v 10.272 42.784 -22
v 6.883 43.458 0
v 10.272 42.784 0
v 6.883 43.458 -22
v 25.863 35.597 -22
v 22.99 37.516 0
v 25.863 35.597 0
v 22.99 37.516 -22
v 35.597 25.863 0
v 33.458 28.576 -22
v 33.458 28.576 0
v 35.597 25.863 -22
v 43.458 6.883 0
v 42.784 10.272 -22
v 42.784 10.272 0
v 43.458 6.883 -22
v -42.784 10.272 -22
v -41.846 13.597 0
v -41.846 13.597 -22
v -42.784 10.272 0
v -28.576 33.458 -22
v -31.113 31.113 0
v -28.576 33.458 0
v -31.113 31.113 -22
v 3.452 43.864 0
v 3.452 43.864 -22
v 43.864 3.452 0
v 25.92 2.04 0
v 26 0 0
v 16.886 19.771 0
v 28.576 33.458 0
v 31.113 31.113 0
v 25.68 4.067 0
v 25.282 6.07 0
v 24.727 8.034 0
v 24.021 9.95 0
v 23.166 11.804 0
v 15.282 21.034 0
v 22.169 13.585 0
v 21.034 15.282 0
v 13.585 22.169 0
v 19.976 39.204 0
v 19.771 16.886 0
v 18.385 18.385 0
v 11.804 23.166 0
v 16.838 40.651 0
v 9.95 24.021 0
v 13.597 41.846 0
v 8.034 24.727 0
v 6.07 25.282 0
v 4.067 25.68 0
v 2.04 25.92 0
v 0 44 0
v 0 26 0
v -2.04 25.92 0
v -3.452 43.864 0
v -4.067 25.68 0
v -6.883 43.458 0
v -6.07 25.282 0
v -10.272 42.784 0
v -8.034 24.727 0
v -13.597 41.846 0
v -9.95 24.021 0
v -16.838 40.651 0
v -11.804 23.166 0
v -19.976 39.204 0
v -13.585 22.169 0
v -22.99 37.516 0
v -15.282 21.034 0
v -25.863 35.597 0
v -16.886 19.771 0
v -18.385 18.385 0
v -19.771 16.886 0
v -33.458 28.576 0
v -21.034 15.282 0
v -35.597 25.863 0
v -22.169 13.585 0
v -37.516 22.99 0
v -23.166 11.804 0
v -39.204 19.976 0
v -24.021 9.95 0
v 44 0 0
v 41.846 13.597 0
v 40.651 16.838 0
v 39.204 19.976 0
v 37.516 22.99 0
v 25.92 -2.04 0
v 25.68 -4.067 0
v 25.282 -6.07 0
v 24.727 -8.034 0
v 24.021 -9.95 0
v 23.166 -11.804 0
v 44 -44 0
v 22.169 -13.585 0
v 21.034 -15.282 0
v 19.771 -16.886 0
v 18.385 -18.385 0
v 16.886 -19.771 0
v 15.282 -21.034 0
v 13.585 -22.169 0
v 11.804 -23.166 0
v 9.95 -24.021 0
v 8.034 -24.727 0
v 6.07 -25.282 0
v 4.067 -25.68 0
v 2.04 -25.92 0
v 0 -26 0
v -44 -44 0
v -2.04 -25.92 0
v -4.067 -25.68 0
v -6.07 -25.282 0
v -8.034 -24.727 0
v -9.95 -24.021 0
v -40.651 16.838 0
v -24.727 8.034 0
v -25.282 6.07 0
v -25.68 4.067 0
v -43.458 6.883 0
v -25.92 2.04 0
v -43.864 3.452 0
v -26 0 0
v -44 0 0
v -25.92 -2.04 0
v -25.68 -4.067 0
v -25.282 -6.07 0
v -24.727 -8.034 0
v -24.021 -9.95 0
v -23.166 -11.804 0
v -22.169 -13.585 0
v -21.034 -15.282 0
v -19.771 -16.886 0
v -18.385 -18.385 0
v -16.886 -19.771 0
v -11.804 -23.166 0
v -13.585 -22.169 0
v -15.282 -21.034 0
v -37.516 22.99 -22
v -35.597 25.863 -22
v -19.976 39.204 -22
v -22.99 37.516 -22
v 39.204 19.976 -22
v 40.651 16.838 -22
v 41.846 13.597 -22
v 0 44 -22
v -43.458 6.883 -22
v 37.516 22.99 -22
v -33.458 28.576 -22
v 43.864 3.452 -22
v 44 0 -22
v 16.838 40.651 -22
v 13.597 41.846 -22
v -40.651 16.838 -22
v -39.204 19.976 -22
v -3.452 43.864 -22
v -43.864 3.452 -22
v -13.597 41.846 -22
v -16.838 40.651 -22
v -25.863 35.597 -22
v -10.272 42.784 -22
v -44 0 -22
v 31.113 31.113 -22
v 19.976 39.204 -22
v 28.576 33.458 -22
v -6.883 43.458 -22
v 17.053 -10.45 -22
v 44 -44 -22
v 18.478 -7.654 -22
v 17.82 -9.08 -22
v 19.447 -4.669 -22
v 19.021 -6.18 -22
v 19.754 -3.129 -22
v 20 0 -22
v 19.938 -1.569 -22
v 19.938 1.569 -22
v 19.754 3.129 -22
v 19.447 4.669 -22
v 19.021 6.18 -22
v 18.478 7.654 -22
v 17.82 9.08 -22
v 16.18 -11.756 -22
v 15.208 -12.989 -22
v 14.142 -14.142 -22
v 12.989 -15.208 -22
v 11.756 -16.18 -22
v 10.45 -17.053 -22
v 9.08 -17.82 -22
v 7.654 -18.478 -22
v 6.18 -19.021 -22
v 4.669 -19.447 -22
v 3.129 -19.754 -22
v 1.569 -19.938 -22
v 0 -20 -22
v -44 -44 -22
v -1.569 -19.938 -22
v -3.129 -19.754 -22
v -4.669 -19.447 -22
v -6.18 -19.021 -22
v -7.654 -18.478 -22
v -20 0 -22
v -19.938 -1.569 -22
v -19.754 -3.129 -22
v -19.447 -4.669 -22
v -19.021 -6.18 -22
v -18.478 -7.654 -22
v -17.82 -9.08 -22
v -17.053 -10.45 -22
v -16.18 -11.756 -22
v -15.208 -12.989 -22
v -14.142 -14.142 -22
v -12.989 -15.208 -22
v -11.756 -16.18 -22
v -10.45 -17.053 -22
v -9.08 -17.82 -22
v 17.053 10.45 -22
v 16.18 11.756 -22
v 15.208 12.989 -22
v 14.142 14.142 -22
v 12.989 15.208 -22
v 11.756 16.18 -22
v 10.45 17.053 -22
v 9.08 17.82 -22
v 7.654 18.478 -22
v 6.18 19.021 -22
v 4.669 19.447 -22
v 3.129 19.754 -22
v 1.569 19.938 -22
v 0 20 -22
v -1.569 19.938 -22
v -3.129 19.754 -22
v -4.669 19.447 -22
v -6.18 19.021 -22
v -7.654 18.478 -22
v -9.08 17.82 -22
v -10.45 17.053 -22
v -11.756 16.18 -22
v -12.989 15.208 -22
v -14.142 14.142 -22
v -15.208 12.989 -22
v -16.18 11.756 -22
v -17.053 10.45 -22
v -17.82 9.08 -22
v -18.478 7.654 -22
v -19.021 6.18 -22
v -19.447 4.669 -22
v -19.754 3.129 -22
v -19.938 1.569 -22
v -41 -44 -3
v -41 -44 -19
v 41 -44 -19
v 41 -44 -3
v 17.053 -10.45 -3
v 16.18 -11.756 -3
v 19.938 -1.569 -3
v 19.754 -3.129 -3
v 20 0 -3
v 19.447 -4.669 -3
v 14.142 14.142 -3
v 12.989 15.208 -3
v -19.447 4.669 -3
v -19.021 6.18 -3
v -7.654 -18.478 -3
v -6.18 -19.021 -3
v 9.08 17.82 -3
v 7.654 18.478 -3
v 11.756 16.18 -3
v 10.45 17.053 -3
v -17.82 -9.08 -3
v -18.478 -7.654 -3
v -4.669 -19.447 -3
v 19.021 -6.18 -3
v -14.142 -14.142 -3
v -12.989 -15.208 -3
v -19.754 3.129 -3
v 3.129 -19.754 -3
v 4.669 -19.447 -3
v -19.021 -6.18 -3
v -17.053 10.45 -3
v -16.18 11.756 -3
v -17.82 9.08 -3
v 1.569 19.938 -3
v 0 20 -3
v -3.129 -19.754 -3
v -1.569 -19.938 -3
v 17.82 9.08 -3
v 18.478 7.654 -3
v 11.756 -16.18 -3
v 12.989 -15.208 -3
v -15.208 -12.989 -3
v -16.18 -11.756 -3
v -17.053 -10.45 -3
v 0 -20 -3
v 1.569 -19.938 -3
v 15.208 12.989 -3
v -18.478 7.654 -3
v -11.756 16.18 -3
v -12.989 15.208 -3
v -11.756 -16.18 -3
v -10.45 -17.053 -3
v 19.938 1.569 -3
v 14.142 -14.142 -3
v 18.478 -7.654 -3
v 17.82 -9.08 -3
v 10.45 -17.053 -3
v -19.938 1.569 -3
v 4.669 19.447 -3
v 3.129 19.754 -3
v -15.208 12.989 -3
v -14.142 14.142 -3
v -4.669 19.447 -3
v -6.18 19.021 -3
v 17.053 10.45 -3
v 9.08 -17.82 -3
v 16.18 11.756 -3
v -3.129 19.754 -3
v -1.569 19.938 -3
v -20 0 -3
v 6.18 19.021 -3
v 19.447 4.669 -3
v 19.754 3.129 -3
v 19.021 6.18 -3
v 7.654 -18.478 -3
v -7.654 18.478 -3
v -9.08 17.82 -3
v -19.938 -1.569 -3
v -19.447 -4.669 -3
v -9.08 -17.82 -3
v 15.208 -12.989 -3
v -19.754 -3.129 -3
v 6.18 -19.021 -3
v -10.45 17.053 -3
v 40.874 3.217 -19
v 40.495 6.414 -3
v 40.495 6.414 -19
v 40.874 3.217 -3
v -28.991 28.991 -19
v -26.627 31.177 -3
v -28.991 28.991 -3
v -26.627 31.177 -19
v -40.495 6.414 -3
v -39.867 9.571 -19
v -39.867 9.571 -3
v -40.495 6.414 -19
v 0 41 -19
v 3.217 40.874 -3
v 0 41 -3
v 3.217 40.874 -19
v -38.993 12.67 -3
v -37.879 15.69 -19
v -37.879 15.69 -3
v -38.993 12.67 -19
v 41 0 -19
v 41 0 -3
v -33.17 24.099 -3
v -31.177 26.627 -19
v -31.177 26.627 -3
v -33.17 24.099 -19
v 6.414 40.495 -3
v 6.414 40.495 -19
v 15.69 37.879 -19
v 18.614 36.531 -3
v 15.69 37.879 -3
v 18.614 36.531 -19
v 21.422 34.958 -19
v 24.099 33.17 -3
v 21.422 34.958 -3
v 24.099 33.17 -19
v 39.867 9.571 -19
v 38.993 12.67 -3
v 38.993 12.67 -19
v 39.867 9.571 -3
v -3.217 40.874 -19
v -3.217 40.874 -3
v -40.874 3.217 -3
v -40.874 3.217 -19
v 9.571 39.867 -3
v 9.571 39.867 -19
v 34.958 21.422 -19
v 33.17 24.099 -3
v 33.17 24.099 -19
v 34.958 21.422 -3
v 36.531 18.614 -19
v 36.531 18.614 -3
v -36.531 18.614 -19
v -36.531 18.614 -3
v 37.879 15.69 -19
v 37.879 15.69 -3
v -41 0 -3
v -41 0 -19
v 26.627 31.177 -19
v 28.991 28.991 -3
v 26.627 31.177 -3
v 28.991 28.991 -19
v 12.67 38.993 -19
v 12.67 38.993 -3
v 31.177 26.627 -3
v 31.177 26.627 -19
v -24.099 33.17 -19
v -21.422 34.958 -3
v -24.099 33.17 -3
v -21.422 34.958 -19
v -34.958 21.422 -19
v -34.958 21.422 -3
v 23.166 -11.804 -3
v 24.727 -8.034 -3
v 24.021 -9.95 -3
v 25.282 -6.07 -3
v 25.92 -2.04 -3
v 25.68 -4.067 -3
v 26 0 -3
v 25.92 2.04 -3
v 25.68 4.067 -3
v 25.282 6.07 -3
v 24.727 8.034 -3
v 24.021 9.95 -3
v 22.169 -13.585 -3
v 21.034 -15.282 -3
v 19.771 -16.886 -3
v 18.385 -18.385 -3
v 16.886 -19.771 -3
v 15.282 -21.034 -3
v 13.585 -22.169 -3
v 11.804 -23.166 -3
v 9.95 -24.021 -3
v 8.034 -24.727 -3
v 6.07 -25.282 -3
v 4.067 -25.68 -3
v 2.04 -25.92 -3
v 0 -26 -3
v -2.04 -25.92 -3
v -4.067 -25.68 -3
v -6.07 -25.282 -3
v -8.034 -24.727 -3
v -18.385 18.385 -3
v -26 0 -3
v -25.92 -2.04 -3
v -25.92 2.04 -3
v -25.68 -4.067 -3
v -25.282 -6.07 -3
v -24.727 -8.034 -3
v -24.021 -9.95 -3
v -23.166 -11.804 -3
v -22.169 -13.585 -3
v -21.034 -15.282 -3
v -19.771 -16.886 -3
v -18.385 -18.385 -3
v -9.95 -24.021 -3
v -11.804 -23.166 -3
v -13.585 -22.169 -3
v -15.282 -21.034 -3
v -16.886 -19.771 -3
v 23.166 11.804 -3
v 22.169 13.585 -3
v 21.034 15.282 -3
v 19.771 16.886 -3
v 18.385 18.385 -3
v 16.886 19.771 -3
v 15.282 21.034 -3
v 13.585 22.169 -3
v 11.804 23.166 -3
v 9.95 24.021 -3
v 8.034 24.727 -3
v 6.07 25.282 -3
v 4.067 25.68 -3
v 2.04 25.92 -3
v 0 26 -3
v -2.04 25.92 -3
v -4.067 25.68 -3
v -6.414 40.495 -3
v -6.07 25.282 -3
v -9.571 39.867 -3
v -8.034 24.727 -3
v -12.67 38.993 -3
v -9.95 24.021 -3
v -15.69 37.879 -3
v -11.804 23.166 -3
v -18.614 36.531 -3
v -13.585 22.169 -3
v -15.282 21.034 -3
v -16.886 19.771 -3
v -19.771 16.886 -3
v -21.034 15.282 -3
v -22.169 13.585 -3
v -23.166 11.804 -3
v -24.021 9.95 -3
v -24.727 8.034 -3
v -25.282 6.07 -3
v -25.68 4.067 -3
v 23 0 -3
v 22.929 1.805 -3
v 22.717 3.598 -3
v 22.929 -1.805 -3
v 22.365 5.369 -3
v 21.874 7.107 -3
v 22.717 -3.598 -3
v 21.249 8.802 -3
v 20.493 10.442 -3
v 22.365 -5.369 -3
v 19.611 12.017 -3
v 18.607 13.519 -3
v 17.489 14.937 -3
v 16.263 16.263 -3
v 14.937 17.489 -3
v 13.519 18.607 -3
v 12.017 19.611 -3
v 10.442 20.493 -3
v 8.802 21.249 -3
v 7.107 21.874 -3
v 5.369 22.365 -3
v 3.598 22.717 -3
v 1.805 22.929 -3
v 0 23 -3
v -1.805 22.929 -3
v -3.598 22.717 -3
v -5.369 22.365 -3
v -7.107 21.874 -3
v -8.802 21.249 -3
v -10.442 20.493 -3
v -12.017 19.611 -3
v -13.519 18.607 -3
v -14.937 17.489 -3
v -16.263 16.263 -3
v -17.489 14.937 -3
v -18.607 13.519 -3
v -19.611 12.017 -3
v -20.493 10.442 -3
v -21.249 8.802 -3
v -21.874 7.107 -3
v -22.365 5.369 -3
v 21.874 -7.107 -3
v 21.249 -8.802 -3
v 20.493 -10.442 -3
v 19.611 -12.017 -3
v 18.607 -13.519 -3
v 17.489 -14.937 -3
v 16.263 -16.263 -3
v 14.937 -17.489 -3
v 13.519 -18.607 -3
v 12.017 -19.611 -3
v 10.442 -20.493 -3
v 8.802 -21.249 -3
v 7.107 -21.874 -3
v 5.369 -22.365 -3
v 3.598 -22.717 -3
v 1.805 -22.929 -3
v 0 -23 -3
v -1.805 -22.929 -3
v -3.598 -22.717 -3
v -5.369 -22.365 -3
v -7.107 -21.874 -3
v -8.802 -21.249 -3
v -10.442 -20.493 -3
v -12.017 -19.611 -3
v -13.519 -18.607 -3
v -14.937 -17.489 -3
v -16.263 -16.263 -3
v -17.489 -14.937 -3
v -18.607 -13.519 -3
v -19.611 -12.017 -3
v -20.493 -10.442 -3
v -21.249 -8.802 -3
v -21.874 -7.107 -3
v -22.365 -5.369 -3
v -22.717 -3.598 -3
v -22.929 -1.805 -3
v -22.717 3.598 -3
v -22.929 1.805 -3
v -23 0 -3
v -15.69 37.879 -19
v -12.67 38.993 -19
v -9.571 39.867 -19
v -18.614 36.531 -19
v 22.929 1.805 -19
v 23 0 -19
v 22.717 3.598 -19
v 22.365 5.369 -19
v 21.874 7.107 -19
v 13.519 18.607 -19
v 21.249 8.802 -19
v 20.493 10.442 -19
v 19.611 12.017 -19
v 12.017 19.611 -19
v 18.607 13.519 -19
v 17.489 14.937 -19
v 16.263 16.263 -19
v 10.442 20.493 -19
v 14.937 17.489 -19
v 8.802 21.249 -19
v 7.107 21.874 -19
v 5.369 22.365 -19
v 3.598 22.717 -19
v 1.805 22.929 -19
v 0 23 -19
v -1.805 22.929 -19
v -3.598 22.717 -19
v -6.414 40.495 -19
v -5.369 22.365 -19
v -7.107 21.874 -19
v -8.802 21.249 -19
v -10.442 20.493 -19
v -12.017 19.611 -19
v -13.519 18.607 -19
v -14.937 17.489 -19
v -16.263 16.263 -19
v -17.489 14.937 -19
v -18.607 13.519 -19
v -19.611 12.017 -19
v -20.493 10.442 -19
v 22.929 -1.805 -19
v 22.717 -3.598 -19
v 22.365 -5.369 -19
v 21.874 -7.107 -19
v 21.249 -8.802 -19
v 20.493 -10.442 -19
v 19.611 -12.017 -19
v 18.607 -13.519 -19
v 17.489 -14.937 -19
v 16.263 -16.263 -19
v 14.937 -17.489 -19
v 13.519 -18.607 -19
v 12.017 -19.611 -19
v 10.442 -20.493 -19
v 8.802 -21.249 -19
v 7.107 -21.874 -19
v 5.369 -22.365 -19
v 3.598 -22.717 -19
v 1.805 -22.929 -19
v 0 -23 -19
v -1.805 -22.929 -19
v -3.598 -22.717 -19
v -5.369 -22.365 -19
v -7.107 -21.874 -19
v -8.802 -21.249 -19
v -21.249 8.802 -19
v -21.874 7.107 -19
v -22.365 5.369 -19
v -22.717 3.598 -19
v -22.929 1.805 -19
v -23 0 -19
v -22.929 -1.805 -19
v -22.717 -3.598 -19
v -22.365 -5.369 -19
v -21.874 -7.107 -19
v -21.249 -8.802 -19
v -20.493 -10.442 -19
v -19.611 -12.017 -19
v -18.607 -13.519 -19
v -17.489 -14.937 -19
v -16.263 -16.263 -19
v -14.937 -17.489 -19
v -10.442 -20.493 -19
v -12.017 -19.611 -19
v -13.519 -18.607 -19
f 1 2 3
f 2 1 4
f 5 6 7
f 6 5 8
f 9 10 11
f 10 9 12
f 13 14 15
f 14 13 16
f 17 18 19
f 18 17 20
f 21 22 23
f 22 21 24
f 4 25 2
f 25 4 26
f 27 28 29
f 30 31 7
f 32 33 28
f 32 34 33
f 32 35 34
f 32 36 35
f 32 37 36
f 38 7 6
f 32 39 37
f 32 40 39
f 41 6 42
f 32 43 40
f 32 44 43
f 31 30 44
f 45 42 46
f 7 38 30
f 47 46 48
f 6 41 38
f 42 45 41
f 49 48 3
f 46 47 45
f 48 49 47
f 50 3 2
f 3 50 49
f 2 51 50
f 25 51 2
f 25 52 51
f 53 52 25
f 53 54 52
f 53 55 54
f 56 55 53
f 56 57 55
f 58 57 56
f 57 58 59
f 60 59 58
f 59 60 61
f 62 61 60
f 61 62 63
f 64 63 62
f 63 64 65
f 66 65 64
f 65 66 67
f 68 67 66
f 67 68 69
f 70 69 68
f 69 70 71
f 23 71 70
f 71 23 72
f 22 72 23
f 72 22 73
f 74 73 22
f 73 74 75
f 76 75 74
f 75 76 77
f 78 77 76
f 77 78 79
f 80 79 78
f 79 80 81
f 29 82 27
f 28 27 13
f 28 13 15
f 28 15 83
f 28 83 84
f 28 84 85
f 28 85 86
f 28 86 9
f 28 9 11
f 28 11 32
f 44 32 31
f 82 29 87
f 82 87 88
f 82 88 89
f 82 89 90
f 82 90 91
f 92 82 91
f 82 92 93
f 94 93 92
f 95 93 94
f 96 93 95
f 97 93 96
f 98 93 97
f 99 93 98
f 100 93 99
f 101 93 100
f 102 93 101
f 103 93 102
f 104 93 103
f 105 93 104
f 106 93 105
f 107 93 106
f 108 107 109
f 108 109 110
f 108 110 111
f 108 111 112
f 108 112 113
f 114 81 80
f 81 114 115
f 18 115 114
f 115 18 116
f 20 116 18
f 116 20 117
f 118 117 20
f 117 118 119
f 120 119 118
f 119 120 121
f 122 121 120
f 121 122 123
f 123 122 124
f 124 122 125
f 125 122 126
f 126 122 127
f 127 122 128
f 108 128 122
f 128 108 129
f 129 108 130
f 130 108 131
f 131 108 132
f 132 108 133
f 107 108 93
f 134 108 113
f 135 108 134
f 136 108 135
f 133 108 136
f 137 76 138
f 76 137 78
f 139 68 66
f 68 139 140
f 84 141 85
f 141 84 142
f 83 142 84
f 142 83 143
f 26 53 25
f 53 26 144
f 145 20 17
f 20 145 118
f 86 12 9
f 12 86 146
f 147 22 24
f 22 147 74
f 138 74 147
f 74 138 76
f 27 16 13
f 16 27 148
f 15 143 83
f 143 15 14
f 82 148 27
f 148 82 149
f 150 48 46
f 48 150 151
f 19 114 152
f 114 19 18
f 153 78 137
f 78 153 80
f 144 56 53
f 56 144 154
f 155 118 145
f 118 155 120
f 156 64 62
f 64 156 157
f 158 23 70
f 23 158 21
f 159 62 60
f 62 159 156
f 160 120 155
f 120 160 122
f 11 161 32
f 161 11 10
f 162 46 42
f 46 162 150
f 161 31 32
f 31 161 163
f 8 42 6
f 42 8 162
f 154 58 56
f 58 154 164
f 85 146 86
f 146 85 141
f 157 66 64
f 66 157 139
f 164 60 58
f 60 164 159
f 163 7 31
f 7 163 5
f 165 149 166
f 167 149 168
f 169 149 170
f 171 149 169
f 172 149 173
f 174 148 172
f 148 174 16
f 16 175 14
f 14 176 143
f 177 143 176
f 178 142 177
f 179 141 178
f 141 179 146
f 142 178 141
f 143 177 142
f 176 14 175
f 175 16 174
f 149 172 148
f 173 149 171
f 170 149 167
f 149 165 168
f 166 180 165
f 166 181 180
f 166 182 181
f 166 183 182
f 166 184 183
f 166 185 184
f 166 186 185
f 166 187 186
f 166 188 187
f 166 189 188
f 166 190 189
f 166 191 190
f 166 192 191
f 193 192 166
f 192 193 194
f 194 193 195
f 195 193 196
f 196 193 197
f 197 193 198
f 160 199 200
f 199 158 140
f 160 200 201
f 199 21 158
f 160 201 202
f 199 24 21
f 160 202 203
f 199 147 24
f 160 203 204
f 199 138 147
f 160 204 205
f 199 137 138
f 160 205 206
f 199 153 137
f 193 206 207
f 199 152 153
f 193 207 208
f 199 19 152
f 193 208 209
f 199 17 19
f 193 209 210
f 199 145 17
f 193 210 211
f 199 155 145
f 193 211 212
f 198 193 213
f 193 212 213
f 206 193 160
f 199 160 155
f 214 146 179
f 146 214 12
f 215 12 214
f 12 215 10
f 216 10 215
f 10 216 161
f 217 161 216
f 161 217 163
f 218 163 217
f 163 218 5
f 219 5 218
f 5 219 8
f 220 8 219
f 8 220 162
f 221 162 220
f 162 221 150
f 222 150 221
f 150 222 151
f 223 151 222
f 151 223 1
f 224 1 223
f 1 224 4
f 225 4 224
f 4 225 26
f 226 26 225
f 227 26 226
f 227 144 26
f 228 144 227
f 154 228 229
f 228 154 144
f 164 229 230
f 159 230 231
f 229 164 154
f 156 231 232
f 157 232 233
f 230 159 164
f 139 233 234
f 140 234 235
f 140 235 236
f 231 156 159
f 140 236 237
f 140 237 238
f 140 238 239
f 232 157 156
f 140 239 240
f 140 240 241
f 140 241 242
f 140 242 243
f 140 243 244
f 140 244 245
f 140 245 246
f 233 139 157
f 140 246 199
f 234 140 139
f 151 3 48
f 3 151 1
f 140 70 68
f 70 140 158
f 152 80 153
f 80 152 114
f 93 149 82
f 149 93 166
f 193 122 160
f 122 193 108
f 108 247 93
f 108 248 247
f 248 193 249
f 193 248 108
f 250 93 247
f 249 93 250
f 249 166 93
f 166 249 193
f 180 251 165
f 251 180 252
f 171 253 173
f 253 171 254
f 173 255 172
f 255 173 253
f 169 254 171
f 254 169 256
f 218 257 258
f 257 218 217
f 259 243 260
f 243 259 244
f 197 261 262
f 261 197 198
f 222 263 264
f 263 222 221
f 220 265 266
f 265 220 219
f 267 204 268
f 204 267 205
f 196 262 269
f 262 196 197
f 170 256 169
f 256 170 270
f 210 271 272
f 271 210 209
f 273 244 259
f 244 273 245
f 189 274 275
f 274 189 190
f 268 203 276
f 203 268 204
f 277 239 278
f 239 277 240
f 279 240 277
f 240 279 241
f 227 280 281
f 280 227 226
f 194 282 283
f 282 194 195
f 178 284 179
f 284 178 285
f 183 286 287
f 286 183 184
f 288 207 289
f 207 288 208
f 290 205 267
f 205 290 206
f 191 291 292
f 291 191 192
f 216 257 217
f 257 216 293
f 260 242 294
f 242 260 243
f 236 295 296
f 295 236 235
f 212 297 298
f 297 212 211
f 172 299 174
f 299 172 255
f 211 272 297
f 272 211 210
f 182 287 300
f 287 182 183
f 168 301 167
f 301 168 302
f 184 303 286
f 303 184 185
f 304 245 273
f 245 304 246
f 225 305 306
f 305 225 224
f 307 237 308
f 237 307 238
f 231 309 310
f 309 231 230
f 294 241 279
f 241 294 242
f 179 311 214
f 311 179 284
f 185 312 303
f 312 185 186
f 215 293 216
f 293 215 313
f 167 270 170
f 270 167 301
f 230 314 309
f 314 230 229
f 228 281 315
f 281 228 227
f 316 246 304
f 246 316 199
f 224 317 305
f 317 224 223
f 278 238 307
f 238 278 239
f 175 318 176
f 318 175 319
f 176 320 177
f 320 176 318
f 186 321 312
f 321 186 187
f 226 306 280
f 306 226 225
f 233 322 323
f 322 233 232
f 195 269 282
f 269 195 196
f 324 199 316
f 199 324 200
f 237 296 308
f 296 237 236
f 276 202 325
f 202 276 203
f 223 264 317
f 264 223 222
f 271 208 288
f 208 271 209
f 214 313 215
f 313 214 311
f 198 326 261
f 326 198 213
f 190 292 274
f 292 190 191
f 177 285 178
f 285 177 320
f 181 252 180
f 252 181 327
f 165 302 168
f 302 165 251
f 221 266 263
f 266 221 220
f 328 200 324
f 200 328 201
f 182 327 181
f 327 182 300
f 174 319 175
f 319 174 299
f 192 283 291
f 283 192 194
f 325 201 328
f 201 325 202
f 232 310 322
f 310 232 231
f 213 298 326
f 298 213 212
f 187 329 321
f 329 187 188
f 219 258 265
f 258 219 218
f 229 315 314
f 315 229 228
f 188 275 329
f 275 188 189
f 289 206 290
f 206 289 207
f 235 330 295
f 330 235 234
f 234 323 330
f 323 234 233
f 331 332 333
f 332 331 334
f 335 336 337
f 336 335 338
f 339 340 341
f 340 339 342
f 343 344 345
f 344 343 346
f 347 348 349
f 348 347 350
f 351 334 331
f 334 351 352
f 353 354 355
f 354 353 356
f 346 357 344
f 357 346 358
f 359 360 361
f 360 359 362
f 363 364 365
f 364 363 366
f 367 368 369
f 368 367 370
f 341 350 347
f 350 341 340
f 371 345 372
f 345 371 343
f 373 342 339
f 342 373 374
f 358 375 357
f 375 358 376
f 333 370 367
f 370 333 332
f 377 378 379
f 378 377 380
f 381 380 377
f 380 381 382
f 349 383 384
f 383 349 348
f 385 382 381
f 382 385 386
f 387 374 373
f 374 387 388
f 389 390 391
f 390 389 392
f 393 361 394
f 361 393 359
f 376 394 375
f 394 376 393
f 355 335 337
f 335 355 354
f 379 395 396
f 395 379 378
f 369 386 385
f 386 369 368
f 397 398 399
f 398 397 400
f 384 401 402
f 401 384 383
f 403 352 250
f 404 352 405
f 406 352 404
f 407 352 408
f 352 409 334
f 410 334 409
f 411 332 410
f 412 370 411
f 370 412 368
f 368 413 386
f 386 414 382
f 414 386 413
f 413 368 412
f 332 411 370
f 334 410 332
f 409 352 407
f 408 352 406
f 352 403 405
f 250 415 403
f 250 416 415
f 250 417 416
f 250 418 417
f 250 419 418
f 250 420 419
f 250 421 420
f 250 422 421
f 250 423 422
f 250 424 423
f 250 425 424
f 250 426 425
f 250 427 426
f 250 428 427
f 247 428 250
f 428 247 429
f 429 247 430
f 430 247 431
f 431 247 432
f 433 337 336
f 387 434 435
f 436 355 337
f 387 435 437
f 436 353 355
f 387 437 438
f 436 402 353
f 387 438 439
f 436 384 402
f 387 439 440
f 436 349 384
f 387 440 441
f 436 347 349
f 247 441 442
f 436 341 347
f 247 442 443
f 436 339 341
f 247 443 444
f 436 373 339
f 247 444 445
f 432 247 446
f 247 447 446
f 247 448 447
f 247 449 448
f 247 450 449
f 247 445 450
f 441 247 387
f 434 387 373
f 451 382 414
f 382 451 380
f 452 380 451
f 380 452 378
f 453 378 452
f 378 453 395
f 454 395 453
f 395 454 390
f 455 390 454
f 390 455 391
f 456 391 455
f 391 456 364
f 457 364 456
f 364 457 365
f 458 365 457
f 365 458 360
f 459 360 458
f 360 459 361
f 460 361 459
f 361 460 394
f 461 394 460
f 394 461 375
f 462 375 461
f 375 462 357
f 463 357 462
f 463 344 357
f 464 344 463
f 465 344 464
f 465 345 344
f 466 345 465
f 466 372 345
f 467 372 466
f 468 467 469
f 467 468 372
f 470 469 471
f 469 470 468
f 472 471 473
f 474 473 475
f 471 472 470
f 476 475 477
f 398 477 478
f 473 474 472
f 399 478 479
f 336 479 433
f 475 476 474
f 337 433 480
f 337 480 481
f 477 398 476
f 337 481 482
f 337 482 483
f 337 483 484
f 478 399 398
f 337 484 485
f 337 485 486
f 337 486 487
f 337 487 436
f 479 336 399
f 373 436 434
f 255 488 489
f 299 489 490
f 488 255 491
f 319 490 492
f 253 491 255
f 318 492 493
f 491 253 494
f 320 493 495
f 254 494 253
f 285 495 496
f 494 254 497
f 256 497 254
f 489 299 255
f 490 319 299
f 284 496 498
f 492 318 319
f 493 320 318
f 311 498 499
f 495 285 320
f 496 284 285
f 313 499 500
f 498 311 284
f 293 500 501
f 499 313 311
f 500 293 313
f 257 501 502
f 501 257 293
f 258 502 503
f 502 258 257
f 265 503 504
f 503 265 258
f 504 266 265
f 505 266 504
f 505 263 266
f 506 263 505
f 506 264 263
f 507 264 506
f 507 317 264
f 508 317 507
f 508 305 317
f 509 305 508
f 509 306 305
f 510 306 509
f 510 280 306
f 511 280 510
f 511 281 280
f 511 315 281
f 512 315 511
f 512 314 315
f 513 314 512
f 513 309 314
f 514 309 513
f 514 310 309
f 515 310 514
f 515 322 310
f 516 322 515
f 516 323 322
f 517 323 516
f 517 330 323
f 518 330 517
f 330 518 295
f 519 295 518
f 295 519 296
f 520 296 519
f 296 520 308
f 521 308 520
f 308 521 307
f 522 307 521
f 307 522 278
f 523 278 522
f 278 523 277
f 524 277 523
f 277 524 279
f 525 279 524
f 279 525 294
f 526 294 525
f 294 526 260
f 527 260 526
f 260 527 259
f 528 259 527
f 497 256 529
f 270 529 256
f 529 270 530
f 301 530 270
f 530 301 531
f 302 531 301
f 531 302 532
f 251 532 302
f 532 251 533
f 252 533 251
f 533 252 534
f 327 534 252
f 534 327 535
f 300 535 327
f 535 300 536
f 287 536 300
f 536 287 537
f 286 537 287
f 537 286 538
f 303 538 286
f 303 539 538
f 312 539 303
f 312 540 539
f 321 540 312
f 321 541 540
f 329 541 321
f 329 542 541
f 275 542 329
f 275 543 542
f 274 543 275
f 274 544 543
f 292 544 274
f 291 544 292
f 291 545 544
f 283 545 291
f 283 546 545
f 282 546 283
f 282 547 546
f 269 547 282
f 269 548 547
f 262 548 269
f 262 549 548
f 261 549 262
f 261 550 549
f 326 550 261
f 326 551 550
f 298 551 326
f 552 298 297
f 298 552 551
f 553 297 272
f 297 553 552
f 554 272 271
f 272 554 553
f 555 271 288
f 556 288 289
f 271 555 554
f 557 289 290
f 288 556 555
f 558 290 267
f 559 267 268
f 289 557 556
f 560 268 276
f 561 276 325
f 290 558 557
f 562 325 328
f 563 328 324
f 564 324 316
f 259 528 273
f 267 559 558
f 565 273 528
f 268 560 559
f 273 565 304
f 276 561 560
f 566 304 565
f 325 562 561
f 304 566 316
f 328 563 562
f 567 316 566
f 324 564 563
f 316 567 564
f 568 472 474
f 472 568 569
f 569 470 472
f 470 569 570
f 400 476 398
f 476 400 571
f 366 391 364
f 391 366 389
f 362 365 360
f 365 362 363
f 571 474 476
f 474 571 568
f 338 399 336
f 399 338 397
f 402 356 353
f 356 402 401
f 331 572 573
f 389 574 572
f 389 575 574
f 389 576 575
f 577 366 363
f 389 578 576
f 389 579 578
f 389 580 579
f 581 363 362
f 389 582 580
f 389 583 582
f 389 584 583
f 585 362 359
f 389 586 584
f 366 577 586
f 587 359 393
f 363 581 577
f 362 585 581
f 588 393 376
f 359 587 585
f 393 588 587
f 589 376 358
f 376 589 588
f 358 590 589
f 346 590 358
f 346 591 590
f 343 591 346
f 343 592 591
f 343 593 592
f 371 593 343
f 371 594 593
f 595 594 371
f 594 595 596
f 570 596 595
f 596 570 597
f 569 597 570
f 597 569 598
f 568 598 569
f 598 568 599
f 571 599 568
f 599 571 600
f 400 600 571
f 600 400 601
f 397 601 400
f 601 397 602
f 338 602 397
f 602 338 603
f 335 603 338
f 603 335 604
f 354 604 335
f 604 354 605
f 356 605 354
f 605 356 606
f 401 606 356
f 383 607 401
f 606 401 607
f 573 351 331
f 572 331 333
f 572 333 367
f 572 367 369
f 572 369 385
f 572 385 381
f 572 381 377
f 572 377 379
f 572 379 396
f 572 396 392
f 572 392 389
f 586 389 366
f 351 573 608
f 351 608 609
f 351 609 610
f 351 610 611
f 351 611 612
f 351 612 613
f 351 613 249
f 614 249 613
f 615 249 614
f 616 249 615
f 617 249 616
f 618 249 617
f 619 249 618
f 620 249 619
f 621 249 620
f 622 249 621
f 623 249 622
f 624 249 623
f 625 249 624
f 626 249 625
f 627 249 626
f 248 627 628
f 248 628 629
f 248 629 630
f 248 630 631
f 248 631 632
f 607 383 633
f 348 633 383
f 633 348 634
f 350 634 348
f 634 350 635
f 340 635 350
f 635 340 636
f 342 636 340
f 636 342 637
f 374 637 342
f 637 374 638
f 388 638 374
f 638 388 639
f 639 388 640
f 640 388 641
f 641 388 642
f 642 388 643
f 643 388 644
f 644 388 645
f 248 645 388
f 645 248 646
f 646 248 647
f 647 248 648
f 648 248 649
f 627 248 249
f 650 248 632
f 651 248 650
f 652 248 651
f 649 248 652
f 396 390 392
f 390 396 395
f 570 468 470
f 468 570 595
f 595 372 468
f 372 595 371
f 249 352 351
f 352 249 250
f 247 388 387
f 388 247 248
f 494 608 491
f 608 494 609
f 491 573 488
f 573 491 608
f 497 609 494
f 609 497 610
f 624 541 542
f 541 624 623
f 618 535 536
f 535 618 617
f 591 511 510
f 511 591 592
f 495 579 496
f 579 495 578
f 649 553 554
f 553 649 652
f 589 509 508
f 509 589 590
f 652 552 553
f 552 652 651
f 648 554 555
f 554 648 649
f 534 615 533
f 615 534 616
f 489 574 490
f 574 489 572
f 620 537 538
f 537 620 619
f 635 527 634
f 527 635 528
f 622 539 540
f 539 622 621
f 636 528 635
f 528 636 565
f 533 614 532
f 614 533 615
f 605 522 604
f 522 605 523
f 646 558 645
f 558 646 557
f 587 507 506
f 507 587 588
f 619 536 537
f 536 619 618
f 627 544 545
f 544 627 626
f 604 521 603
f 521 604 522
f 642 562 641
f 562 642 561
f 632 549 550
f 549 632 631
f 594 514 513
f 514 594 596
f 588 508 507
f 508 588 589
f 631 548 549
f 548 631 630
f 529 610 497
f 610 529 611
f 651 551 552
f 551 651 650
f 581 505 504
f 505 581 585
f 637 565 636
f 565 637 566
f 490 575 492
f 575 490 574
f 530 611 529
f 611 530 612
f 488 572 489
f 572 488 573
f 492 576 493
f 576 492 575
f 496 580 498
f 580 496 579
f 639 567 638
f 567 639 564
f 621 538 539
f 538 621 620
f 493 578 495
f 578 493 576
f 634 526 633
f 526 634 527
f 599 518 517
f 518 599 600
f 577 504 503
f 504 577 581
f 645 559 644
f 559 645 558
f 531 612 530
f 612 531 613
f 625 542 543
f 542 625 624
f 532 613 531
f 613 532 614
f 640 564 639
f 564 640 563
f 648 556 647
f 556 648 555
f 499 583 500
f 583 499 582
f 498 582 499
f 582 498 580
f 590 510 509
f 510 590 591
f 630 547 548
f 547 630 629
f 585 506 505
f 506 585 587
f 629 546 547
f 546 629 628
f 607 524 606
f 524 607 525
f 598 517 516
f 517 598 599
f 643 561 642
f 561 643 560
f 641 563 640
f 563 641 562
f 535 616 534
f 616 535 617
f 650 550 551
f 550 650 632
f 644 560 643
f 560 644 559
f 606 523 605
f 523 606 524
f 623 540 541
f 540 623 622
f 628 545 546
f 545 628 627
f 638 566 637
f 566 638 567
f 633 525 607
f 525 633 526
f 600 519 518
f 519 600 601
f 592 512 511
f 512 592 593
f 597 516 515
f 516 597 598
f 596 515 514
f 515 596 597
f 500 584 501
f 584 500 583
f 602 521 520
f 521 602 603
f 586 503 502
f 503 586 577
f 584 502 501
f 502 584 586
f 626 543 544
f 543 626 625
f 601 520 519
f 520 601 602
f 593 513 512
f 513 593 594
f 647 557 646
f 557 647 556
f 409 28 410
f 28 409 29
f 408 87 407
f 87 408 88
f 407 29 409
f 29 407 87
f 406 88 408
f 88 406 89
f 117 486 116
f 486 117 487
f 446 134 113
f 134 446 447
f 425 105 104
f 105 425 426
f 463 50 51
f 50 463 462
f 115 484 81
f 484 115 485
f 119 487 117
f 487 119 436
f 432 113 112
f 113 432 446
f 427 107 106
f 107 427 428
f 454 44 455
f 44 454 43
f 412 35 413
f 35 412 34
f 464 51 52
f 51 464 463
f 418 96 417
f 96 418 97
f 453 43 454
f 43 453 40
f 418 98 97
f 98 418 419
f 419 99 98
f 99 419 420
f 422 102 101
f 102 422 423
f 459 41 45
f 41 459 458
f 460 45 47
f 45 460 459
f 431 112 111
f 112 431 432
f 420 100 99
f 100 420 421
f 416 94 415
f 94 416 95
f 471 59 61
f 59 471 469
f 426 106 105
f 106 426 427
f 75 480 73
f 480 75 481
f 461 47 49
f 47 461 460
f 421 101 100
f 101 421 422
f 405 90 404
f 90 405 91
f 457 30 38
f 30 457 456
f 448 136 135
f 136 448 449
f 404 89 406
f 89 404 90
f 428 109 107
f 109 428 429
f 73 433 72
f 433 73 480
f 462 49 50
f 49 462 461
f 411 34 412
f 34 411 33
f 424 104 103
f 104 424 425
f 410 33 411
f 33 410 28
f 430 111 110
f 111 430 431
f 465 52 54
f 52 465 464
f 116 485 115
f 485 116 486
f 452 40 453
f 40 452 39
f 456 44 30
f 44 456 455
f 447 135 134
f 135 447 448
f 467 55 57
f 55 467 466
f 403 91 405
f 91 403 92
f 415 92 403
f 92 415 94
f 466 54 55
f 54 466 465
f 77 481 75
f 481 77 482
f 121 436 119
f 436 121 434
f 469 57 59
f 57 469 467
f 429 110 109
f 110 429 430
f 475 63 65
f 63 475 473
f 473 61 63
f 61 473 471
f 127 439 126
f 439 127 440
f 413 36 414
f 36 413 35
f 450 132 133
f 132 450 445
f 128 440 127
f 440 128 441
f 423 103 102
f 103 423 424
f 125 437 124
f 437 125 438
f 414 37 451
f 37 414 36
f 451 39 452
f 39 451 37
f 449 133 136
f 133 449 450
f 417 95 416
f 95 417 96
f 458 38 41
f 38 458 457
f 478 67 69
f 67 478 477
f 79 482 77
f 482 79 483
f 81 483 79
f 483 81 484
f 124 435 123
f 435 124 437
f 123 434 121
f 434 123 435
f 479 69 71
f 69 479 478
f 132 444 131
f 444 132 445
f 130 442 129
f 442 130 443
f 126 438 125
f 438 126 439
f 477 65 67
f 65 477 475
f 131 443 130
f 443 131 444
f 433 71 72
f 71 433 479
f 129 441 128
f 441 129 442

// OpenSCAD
$fn=80;

wall = 3;
heigth=16;
widht = 82;

extruder = 40;


lock=3;

rotate([180,0,0])
difference(){
 block();
 inside();
 cylinder(r=extruder/2+wall+ lock, h=wall);
}

module inside(){
difference(){
union(){
 translate ([0,0,wall]) cylinder(r=widht/2 , h=heigth);
 translate([- widht/2 ,0,wall]) cube([widht , widht/2 +2*wall, heigth]);
}
 translate ([0,0,wall]) cylinder(r=extruder/2+wall , h=heigth);
}

}


module block(){
	difference(){
	union(){
		cylinder(r=widht/2 +wall, h=heigth+2*wall);
		translate([- widht/2 - wall,0,0])cube([widht + 2*wall, widht/2 + wall, heigth+2*wall]);
	}
	cylinder(r=extruder/2 , h=heigth+2*wall);
}
}
